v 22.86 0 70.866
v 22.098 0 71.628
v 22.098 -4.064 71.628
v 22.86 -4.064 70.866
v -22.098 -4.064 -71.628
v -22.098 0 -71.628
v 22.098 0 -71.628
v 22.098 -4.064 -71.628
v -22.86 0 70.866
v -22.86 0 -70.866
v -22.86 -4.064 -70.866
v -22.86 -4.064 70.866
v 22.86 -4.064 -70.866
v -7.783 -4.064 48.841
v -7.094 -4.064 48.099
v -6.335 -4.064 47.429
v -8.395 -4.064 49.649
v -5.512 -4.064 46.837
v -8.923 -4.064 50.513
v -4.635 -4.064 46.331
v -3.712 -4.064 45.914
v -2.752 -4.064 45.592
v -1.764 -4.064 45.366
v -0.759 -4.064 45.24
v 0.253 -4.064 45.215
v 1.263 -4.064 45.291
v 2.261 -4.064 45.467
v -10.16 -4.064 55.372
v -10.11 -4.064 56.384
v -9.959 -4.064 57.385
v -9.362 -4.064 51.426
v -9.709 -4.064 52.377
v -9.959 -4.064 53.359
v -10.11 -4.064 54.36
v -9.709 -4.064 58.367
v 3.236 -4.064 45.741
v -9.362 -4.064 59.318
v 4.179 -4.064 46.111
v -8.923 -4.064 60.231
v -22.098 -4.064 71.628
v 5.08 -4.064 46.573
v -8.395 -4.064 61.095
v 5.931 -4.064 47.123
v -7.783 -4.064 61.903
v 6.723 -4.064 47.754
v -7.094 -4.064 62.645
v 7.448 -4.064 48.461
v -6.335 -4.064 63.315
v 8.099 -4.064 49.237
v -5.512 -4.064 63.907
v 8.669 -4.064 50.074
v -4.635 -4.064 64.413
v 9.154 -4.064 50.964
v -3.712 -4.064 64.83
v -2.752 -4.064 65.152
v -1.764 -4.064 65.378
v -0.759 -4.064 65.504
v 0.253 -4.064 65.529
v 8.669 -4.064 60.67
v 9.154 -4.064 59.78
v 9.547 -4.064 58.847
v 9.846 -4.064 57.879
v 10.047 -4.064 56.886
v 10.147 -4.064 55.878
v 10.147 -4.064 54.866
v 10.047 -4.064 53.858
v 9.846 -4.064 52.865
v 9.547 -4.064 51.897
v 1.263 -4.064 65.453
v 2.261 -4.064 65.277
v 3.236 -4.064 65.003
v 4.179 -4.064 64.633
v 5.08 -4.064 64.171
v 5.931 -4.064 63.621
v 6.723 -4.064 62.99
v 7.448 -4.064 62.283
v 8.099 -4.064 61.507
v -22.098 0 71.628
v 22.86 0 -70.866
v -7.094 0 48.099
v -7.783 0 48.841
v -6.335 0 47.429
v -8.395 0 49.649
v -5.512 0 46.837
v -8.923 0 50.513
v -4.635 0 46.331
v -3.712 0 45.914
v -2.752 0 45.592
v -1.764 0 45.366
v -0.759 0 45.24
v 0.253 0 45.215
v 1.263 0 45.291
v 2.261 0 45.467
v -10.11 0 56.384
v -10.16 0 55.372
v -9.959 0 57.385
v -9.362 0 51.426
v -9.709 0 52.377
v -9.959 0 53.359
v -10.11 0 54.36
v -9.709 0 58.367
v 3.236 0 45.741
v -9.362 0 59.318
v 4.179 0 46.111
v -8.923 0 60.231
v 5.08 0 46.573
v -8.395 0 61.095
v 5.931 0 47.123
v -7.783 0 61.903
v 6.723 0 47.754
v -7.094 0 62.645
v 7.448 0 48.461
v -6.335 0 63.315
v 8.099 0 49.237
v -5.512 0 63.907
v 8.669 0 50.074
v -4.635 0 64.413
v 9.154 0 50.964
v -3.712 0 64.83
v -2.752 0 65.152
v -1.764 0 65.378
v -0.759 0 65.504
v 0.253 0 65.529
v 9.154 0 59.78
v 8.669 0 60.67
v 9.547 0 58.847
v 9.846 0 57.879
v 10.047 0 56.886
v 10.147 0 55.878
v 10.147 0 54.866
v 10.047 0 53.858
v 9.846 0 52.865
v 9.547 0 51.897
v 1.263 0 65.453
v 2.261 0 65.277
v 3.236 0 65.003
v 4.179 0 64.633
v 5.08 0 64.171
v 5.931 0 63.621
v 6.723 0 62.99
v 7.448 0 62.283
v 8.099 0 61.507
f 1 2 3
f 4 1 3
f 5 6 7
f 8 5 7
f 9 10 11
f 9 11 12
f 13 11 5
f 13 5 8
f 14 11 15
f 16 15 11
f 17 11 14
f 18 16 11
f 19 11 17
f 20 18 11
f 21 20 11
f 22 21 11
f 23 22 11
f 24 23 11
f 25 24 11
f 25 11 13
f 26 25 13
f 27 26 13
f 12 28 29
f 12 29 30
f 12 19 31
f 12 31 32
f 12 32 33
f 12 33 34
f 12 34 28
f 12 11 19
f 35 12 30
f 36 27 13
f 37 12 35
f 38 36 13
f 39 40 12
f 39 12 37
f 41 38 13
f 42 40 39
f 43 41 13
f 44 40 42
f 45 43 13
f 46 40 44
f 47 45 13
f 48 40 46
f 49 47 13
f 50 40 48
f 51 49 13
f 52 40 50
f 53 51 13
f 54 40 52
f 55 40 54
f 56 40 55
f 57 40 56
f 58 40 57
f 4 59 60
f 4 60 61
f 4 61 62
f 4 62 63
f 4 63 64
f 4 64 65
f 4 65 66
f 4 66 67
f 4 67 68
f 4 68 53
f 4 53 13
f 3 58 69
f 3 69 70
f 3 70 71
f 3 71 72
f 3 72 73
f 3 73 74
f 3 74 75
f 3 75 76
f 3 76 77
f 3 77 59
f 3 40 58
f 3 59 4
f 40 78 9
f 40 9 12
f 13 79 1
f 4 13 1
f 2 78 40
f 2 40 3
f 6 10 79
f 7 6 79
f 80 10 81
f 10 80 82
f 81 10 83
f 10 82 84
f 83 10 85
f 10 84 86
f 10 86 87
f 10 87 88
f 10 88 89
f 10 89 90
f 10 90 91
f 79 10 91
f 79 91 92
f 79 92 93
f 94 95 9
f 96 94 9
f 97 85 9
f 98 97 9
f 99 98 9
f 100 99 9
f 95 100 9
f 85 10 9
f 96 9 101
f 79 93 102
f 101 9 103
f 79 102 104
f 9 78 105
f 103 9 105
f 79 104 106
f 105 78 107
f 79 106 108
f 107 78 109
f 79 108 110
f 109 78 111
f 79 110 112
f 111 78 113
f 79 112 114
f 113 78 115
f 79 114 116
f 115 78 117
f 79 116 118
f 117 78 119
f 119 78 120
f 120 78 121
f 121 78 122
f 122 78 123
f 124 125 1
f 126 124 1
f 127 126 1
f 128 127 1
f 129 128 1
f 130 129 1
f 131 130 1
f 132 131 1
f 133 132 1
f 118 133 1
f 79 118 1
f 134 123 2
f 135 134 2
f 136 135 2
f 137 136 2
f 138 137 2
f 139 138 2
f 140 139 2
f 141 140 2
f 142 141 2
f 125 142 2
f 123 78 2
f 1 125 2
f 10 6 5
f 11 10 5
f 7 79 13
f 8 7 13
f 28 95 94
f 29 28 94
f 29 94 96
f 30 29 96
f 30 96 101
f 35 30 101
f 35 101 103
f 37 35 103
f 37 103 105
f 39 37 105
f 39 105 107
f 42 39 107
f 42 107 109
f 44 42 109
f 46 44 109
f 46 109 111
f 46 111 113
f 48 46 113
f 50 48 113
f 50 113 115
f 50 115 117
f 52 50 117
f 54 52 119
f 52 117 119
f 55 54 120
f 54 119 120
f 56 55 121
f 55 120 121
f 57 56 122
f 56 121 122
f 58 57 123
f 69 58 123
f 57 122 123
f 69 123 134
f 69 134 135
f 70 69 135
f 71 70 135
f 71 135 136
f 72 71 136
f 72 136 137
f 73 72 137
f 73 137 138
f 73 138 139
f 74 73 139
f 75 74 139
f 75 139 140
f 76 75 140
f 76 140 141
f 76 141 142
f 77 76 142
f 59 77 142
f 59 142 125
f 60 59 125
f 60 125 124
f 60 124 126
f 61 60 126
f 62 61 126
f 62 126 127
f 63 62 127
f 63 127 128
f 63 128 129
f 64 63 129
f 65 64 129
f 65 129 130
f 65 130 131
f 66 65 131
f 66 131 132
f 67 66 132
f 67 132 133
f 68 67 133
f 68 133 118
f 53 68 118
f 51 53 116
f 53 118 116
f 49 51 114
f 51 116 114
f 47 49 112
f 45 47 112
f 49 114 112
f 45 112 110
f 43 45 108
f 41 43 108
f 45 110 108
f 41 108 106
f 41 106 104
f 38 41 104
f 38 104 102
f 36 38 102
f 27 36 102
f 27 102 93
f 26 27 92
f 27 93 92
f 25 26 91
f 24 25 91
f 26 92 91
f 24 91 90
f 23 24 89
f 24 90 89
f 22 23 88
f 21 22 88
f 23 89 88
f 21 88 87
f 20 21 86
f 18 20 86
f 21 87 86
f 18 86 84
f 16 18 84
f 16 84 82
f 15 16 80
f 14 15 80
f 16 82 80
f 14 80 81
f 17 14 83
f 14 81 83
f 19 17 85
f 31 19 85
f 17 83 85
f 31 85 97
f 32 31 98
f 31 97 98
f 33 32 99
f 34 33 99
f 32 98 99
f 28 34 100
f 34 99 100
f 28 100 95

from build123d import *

# Parameters (mm, degrees)
F0_W     = 45.72
F0_H     = 143.256
F1_DEPTH = 4.064
F2_SIZE2 = 0.762
F2_SIZE  = 0.762
F4_D     = 20.32


with BuildPart() as f1:
    # F0 (on Front) → F1 (new body)
    with BuildSketch(Plane.XZ):
        Rectangle(F0_W, F0_H)
    extrude(amount=F1_DEPTH)

    # F2
    f2_edges = [f1.edges().sort_by_distance(p)[0] for p in [
        (22.86, -2.032, 71.628),
        (-22.86, -2.032, 71.628),
        (-22.86, -2.032, -71.628),
        (22.86, -2.032, -71.628),
    ]]
    chamfer(f2_edges, length=F2_SIZE, length2=F2_SIZE2)

    # F4 (through all)
    with Locations(Plane.XZ.offset(4.064)):
        with Locations((0, 55.372)):
            Hole(F4_D / 2)


solid = f1.part
